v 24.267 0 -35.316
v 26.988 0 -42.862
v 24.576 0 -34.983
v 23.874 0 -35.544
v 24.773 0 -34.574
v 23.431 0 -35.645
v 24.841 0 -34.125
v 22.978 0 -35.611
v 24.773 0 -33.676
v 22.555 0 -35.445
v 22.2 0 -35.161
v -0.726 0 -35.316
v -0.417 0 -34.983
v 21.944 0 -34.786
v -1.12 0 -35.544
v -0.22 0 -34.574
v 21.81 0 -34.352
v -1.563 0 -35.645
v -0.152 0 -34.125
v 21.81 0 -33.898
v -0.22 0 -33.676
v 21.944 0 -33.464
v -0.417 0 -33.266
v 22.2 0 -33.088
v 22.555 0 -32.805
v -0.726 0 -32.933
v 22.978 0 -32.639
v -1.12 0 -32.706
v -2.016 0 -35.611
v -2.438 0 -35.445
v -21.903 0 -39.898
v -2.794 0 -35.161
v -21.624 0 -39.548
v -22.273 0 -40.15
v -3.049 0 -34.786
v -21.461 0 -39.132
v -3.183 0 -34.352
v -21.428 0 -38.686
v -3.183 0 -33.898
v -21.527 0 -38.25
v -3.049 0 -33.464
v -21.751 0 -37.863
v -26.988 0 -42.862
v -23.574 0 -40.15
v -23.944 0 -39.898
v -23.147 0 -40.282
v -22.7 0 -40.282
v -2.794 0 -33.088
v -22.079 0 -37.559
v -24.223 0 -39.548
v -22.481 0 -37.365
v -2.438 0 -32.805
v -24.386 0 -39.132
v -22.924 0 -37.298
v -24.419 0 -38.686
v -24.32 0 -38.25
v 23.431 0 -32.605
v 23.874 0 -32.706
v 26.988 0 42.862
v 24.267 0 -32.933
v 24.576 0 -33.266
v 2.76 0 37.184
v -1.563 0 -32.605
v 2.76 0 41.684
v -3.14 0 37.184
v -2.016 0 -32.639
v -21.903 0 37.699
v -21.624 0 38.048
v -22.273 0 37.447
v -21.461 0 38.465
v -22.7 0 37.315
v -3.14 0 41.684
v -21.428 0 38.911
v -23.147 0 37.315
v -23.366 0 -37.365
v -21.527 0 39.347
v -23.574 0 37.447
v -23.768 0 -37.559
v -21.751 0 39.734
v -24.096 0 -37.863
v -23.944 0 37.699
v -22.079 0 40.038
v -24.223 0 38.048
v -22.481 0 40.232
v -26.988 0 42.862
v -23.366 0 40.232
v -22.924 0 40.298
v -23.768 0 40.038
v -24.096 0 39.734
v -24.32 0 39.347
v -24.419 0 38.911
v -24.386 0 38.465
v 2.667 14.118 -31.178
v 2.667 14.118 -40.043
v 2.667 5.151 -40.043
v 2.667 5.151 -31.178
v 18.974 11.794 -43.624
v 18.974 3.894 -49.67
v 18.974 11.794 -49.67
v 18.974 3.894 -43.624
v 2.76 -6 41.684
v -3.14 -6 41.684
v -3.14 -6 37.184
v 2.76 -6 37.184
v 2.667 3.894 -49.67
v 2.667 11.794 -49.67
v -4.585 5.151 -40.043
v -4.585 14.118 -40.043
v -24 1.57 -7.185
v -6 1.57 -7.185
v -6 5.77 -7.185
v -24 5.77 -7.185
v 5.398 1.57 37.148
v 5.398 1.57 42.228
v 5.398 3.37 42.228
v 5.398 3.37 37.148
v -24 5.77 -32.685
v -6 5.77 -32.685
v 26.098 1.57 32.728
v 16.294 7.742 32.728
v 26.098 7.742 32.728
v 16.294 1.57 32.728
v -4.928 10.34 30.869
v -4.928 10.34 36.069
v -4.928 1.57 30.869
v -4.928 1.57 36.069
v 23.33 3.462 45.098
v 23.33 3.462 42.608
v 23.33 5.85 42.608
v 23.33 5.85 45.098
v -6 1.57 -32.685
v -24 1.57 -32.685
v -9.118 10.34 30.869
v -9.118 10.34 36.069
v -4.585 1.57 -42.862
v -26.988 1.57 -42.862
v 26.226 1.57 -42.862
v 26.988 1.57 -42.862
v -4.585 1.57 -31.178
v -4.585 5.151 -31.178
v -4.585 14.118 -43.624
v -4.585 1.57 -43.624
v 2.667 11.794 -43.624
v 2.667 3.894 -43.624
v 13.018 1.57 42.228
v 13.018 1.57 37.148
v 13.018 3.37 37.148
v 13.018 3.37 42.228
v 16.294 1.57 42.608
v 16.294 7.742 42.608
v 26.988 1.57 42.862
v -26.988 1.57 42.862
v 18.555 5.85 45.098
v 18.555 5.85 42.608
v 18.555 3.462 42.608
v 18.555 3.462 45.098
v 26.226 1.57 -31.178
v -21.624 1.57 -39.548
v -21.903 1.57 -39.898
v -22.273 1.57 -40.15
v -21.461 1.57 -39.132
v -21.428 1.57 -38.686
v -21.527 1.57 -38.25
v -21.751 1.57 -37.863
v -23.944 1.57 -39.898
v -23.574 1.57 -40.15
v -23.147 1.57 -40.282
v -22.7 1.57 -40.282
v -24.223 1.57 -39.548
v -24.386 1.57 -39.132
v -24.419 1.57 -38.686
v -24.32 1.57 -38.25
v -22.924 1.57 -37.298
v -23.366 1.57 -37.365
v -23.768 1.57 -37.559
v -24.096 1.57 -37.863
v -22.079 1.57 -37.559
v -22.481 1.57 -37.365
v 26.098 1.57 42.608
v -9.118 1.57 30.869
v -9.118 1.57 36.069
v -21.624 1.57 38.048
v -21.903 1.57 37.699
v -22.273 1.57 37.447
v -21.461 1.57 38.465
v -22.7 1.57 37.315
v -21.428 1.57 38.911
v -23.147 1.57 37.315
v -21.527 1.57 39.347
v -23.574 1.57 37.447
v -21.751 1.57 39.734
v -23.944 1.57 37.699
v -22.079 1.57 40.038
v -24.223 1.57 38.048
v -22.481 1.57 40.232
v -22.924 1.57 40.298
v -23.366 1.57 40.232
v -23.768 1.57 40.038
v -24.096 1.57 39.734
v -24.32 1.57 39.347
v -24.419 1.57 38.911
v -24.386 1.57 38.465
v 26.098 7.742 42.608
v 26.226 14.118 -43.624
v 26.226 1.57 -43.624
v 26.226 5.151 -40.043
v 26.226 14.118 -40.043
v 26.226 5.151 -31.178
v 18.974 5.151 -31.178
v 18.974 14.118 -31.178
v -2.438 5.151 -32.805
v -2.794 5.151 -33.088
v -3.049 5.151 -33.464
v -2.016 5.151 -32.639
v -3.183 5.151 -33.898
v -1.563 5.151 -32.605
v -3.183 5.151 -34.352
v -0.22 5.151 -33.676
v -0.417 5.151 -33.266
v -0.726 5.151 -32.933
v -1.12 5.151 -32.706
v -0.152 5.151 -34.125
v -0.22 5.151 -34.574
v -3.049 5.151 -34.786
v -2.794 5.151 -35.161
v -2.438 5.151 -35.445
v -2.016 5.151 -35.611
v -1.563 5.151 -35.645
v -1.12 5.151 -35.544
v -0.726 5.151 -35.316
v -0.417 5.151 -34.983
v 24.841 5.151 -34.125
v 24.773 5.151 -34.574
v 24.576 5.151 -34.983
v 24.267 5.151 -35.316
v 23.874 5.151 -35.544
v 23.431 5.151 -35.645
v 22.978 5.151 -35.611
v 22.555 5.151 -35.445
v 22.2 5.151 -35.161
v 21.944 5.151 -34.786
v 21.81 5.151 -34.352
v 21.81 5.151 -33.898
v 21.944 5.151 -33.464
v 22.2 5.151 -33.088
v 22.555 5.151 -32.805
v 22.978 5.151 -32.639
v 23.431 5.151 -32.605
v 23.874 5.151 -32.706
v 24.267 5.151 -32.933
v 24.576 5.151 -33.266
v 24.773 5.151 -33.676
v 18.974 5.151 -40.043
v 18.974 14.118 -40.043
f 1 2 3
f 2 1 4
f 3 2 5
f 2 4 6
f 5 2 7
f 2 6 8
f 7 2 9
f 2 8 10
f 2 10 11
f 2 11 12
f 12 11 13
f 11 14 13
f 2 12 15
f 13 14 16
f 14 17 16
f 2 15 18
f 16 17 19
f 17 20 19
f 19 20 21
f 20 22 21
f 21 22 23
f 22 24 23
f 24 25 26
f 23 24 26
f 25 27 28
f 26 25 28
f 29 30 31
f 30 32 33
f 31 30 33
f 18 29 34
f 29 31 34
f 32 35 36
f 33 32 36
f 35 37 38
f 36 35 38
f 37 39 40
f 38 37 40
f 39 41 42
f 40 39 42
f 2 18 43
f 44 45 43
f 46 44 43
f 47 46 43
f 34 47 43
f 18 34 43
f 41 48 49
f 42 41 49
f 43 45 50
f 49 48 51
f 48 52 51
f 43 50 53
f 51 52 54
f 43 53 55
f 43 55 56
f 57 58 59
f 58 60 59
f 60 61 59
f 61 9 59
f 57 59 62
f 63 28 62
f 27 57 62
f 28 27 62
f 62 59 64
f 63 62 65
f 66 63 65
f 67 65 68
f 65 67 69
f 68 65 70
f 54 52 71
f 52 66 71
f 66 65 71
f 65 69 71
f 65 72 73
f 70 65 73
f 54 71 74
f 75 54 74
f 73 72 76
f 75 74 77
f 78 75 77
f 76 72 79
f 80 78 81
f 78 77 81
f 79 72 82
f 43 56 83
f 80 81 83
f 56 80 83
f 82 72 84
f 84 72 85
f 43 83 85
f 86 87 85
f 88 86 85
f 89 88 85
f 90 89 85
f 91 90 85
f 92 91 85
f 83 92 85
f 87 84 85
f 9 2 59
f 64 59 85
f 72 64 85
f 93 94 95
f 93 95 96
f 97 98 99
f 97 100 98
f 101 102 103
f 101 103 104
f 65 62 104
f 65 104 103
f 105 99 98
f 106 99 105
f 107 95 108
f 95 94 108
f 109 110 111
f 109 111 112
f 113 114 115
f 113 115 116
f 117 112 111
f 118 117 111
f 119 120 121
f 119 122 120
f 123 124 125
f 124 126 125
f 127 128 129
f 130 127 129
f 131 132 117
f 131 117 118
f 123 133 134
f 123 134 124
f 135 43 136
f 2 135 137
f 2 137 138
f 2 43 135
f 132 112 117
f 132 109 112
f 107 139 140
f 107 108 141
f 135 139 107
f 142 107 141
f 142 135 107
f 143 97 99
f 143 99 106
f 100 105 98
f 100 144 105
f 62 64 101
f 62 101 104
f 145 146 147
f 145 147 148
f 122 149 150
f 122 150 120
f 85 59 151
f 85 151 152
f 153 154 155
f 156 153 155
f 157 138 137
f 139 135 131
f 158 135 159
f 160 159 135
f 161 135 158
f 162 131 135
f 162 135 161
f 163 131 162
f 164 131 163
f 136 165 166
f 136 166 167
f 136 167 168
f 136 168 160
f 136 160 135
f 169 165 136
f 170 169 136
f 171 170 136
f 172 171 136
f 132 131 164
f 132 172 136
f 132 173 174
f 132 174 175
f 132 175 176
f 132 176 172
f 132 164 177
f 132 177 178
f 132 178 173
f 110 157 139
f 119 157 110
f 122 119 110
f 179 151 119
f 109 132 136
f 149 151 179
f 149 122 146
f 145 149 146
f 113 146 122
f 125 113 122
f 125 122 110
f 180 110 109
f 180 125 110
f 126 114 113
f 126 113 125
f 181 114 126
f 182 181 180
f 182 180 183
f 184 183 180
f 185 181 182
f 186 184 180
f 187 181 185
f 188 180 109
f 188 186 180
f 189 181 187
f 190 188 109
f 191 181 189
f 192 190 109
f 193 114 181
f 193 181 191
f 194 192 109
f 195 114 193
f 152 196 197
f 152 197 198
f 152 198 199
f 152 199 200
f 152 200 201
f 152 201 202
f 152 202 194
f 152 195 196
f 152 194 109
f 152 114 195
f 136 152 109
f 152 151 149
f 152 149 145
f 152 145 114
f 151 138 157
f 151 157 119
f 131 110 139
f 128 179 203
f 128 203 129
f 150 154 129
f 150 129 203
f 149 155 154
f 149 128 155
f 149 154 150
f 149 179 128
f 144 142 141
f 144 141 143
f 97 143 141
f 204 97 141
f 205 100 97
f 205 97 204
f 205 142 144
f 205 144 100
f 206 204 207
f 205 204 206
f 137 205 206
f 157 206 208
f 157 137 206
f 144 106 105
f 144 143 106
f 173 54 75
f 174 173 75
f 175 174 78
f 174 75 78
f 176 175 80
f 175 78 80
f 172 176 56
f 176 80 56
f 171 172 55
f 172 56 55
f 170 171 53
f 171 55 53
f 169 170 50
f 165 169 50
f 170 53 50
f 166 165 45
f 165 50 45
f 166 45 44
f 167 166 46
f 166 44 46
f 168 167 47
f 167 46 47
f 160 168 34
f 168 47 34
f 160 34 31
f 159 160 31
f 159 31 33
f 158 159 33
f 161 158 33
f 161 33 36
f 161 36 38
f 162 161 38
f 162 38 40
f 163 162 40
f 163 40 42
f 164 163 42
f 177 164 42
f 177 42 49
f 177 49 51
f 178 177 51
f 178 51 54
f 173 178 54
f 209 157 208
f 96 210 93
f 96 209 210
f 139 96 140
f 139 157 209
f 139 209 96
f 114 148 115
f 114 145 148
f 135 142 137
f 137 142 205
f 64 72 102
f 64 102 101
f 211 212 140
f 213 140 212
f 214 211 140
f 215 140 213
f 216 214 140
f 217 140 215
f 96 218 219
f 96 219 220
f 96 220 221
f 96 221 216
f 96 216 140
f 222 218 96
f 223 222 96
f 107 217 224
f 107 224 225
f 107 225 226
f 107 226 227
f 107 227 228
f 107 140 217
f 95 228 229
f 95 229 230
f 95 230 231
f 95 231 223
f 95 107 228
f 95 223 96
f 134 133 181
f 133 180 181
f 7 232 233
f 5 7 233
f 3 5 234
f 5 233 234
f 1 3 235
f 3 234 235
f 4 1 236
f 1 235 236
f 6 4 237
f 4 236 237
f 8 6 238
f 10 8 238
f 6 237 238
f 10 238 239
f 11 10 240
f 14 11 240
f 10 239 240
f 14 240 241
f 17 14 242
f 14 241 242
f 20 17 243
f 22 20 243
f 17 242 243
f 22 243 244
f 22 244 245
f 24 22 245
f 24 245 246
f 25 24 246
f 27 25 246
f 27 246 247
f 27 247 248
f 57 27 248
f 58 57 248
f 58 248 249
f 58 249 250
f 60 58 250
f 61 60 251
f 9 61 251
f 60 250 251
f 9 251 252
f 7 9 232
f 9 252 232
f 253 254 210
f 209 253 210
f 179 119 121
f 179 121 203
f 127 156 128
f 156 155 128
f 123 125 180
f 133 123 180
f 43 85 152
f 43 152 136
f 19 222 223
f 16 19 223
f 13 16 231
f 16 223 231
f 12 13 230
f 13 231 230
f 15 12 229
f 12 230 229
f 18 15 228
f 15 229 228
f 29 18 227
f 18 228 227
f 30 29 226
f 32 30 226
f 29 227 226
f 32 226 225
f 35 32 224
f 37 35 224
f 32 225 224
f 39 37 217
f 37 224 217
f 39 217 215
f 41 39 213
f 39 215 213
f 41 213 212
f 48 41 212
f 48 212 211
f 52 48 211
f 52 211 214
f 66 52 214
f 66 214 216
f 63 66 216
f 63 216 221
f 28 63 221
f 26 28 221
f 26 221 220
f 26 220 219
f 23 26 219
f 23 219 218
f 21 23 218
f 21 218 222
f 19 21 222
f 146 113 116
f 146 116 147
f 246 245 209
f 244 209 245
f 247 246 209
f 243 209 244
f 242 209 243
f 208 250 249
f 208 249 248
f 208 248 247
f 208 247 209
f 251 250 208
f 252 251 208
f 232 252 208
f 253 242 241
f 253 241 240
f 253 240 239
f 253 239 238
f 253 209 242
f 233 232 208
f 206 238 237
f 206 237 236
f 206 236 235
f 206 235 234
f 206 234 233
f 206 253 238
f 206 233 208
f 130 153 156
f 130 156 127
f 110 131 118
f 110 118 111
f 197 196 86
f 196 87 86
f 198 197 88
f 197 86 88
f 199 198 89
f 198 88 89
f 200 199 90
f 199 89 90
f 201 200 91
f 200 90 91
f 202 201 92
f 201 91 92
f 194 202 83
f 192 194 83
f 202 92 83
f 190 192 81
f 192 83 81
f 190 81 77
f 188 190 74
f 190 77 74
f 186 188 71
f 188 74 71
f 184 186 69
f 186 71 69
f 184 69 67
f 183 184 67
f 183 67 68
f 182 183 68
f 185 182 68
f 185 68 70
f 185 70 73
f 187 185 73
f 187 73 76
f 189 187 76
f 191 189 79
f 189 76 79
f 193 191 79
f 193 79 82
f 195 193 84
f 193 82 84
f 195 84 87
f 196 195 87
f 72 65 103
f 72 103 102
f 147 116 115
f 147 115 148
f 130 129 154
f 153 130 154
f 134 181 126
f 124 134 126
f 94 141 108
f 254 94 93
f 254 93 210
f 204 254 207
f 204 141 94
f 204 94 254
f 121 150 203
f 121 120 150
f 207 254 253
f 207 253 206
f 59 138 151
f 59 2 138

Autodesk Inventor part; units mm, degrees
ref_plane "YZ Plane" through (0, 0, 0) normal (1, 0, 0) x (0, 1, 0)
ref_plane "XZ Plane" through (0, 0, 0) normal (0, 1, 0) x (-1, 0, 0)
ref_plane "XY Plane" through (0, 0, 0) normal (0, 0, 1) x (1, 0, 0)
sketch "Sketch1" plane through (0, 0, 0) normal (0, 1, 0) x (-1, 0, 0)
  line L0 (-26.9875, 42.8625) -> (26.9875, 42.8625)
  line L1 (26.9875, 42.8625) -> (26.9875, -42.8625)
  line L2 (26.9875, -42.8625) -> (-26.9875, -42.8625)
  line L3 (-26.9875, -42.8625) -> (-26.9875, 42.8625)
  line L4 (-26.9875, 42.8625) -> (26.9875, -42.8625) construction
  line L5 (26.9875, 42.8625) -> (-26.9875, -42.8625) construction
  point P0 (0, 0)
  dimension "d0" = 53.975
  dimension "d1" = 85.725
extrude "Extrusion1" add sketch "Sketch1" along normal blind 1.57
sketch "Sketch2" plane through (0, 1.57, 0) normal (0, 1, 0) x (1, 0, 0)
  line L0 (-26.9875, -42.8625) -> (26.9875, -42.8625) projected
  line L1 (-26.9875, 42.8625) -> (-26.9875, -42.8625) projected
  line L2 (26.9875, 42.8625) -> (-26.9875, 42.8625) projected
  line L3 (26.9875, -42.8625) -> (26.9875, 42.8625) projected
  point P0 (0, 0)
  point P1 (-22.9235, -38.7985)
  point P2 (-22.9235, 38.7985)
  dimension "d4" = 4.064
  dimension "d5" = 4.064
  dimension "d6" = 4.064
  dimension "d7" = 4.064
hole "Hole1" at (-22.9235, 1.57, 38.7985) at (-22.9235, 1.57, -38.7985) direction (0, -1, 0) diameter 3 depth 2.54
sketch "Sketch5" plane through (0, 1.57, 0) normal (0, 1, 0) x (1, 0, 0)
  line L0 (-26.9875, -42.8625) -> (26.9875, -42.8625) projected
  line L1 (26.9875, -42.8625) -> (26.9875, 42.8625) projected
  line L2 (-4.9284, -30.8693) -> (-9.1184, -30.8693)
  line L3 (-9.1184, -30.8693) -> (-9.1184, -36.0693)
  line L4 (-9.1184, -36.0693) -> (-4.9284, -36.0693)
  line L5 (-4.9284, -36.0693) -> (-4.9284, -30.8693)
  line L6 (-4.9284, -30.8693) -> (-9.1184, -36.0693) construction
  line L7 (-9.1184, -30.8693) -> (-4.9284, -36.0693) construction
  point P0 (0, 0)
  point P1 (-7.3025, -33.9725)
  point P2 (-7.0234, -33.4693)
  dimension "d26" = 8.89
  dimension "d27" = 34.29
  dimension "d28" = 5.2
  dimension "d29" = 4.19
extrude "Extrusion4" add sketch "Sketch5" along normal blind 8.77
sketch "Sketch6" plane through (0, 1.57, 0) normal (0, 1, 0) x (1, 0, 0)
  line L0 (-6.0004, 7.1846) -> (-24.0004, 7.1846)
  line L1 (-24.0004, 7.1846) -> (-24.0004, 32.6846)
  line L2 (-24.0004, 32.6846) -> (-6.0004, 32.6846)
  line L3 (-6.0004, 32.6846) -> (-6.0004, 7.1846)
  line L4 (-6.0004, 7.1846) -> (-24.0004, 32.6846) construction
  line L5 (-24.0004, 7.1846) -> (-6.0004, 32.6846) construction
  point P0 (0, 0)
  point P1 (-15.0004, 19.9346)
  dimension "d34" = 25.5
  dimension "d35" = 18
extrude "Extrusion5" add sketch "Sketch6" along normal blind 4.2
sketch "Sketch7" plane through (0, 0, 0) normal (0, -1, 0) x (1, 0, 0)
  line L0 (2.7595, 37.1835) -> (-3.1405, 37.1835)
  line L1 (-3.1405, 37.1835) -> (-3.1405, 41.6835)
  line L2 (-3.1405, 41.6835) -> (2.7595, 41.6835)
  line L3 (2.7595, 41.6835) -> (2.7595, 37.1835)
  line L4 (2.7595, 37.1835) -> (-3.1405, 41.6835) construction
  line L5 (-3.1405, 37.1835) -> (2.7595, 41.6835) construction
  line L6 (-26.9875, 42.8625) -> (26.9875, 42.8625) projected
  line L7 (-26.9875, -42.8625) -> (-26.9875, 42.8625) projected
  line L8 (26.9875, 42.8625) -> (26.9875, -42.8625) projected
  point P0 (0, 0)
  point P1 (-0.1905, 39.4335)
  dimension "d36" = 4.5
  dimension "d37" = 5.9
  dimension "d38" = 3.429
  dimension "d40" = 27.178
extrude "Extrusion6" add sketch "Sketch7" along normal blind 6
sketch "Sketch8" plane through (0, 1.57, 0) normal (0, 1, 0) x (1, 0, 0)
  line L0 (26.0985, -42.6085) -> (16.2941, -42.6085)
  line L1 (16.2941, -42.6085) -> (16.2941, -32.7279)
  line L2 (16.2941, -32.7279) -> (26.0985, -32.7279)
  line L3 (26.0985, -32.7279) -> (26.0985, -42.6085)
  line L4 (26.0985, -42.6085) -> (16.2941, -32.7279) construction
  line L5 (16.2941, -42.6085) -> (26.0985, -32.7279) construction
  line L6 (26.9875, -42.8625) -> (26.9875, 42.8625) projected
  line L7 (-26.9875, -42.8625) -> (26.9875, -42.8625) projected
  point P0 (0, 0)
  point P1 (21.1963, -37.6682)
  dimension "d43" = 9.8044
  dimension "d44" = 9.8806
  dimension "d45" = 0.889
  dimension "d46" = 0.254
extrude "Extrusion7" add sketch "Sketch8" along normal blind 6.1722
sketch "Sketch9" plane through (16.2941, 1.57, 42.6085) normal (0, 0, 1) x (1, 0, 0)
  line L0 (0, 0) -> (0, 6.1722) projected
  line L1 (7.0358, 4.2799) -> (2.2606, 4.2799)
  line L2 (2.2606, 4.2799) -> (2.2606, 1.8923)
  line L3 (2.2606, 1.8923) -> (7.0358, 1.8923)
  line L4 (7.0358, 1.8923) -> (7.0358, 4.2799)
  line L5 (7.0358, 4.2799) -> (2.2606, 1.8923) construction
  line L6 (2.2606, 4.2799) -> (7.0358, 1.8923) construction
  line L7 (0, 6.1722) -> (9.8044, 6.1722) projected
  point P0 (-16.2941, -1.57)
  point P1 (4.6482, 3.0861)
  dimension "d52" = 3.0861
  dimension "d53" = 2.2606
extrude "Extrusion8" add sketch "Sketch9" along normal blind 2.4892
sketch "Sketch10" plane through (0, 1.57, 0) normal (0, 1, 0) x (1, 0, 0)
  line L0 (26.9875, -42.8625) -> (26.9875, 42.8625) projected
  line L1 (-26.9875, -42.8625) -> (26.9875, -42.8625) projected
  line L2 (13.0175, -42.2275) -> (5.3975, -42.2275)
  line L3 (5.3975, -42.2275) -> (5.3975, -37.1475)
  line L4 (5.3975, -37.1475) -> (13.0175, -37.1475)
  line L5 (13.0175, -37.1475) -> (13.0175, -42.2275)
  line L6 (13.0175, -42.2275) -> (5.3975, -37.1475) construction
  line L7 (5.3975, -42.2275) -> (13.0175, -37.1475) construction
  point P0 (0, 0)
  point P1 (9.2075, -39.6875)
  dimension "d56" = 17.78
  dimension "d57" = 3.175
  dimension "d58" = 7.62
  dimension "d59" = 5.08
extrude "Extrusion9" add sketch "Sketch10" along normal blind 1.8
sketch "Sketch11" plane through (0, 1.57, 0) normal (0, 1, 0) x (1, 0, 0)
  line L0 (26.9875, -42.8625) -> (26.9875, 42.8625) projected
  line L1 (26.9875, 42.8625) -> (-26.9875, 42.8625) projected
  circle A0 centre (23.3172, 34.1249) radius 1.524
  circle A1 centre (-1.6764, 34.1249) radius 1.524
  point P0 (0, 0)
  dimension "d62" = 3.6703
  dimension "d63" = 24.9936
  dimension "d64" = 8.7376
  dimension "d65" = 8.7376
  dimension "d66" = 3.048
  dimension "d67" = 3.048
sketch "Sketch12" plane through (0, 1.57, 0) normal (0, 1, 0) x (1, 0, 0)
  line L0 (26.9875, -42.8625) -> (26.9875, 42.8625) projected
  line L1 (26.9875, 34.1249) -> (26.2255, 34.1249)
  line L2 (26.9875, 34.1249) -> (27.7495, 34.1249) construction
  line L3 (26.9875, 42.8625) -> (-26.9875, 42.8625) projected
  line L4 (26.2255, 34.1249) -> (26.2255, 31.1785)
  line L5 (26.2255, 31.1785) -> (-4.5847, 31.1785)
  line L6 (-4.5847, 31.1785) -> (-4.5847, 43.6245)
  line L7 (-4.5847, 43.6245) -> (26.2255, 43.6245)
  line L8 (26.2255, 43.6245) -> (26.2255, 31.1785)
  point P0 (0, 0)
  point P1 (26.2255, 42.8625)
  point P2 (-4.5847, 42.8625)
  dimension "d68" = 0.762
  dimension "d69" = 180
  dimension "d70" = 8.7376
  dimension "d73" = 2.9464
  dimension "d74" = 30.8102
  dimension "d75" = 12.446
extrude "Extrusion10" add sketch "Sketch12" along normal blind 12.5476 contours L4 L5 L6 L3 L8 | L3 L6 L7 L8
sketch "Sketch15" plane through (26.2255, 1.57, -43.6245) normal (0, 0, -1) x (-1, 0, 0)
  line L0 (23.5585, 2.3241) -> (7.2517, 2.3241)
  line L1 (7.2517, 2.3241) -> (7.2517, 10.2235)
  line L2 (7.2517, 10.2235) -> (23.5585, 10.2235)
  line L3 (23.5585, 10.2235) -> (23.5585, 2.3241)
  line L4 (23.5585, 2.3241) -> (7.2517, 10.2235) construction
  line L5 (7.2517, 2.3241) -> (23.5585, 10.2235) construction
  line L6 (30.8102, 0) -> (30.8102, 12.5476) projected
  line L7 (0, 12.5476) -> (30.8102, 12.5476) projected
  point P0 (26.2255, -1.57)
  point P1 (26.9875, 0)
  point P2 (15.4051, 6.2738)
  point P3 (30.8102, 6.2738)
  point P4 (15.4051, 12.5476)
  dimension "d86" = 16.3068
  dimension "d87" = 7.8994
extrude "Extrusion13" add sketch "Sketch15" along normal blind 6.0452
sketch "Sketch16" plane through (0, 14.1176, 0) normal (0, 1, 0) x (1, 0, 0)
  line L0 (26.2255, 43.6245) -> (-4.5847, 43.6245) projected
  line L1 (-1.9136, 43.6245) -> (-1.9136, 40.0431)
  line L2 (-1.9136, 43.6245) -> (1.6678, 43.6245) construction
  line L3 (22.654, 43.6245) -> (22.654, 40.0431)
  line L4 (26.2255, 42.8625) -> (26.2255, 31.1785) projected
  line L5 (18.9738, 43.6245) -> (18.9738, 49.6697) projected
  line L6 (26.2255, 31.1785) -> (-4.5847, 31.1785) projected
  line L7 (-4.5847, 43.6245) -> (-4.5847, 31.1785) projected
  line L8 (2.667, 43.6245) -> (2.667, 49.6697) projected
  line L9 (18.9738, 40.0431) -> (26.2255, 40.0431)
  line L10 (18.9738, 40.0431) -> (18.9738, 31.1785)
  line L11 (2.667, 40.0431) -> (-4.5847, 40.0431)
  line L12 (-4.5847, 31.1785) -> (-4.5847, 42.8625) projected
  line L13 (2.667, 40.0431) -> (2.667, 31.1785)
  point P0 (0, 0)
  dimension "d90" = 3.5814
  dimension "d91" = 270
  dimension "d92" = 3.5814
extrude "Extrusion14" cut sketch "Sketch16" against normal blind 8.9662 contours L9 L4 L6 L10 | L11 L13 L6 L7
extrude "Extrusion15" cut sketch "Sketch11" along normal mid plane 8.9662
properties part number "Spo2 PCB"
